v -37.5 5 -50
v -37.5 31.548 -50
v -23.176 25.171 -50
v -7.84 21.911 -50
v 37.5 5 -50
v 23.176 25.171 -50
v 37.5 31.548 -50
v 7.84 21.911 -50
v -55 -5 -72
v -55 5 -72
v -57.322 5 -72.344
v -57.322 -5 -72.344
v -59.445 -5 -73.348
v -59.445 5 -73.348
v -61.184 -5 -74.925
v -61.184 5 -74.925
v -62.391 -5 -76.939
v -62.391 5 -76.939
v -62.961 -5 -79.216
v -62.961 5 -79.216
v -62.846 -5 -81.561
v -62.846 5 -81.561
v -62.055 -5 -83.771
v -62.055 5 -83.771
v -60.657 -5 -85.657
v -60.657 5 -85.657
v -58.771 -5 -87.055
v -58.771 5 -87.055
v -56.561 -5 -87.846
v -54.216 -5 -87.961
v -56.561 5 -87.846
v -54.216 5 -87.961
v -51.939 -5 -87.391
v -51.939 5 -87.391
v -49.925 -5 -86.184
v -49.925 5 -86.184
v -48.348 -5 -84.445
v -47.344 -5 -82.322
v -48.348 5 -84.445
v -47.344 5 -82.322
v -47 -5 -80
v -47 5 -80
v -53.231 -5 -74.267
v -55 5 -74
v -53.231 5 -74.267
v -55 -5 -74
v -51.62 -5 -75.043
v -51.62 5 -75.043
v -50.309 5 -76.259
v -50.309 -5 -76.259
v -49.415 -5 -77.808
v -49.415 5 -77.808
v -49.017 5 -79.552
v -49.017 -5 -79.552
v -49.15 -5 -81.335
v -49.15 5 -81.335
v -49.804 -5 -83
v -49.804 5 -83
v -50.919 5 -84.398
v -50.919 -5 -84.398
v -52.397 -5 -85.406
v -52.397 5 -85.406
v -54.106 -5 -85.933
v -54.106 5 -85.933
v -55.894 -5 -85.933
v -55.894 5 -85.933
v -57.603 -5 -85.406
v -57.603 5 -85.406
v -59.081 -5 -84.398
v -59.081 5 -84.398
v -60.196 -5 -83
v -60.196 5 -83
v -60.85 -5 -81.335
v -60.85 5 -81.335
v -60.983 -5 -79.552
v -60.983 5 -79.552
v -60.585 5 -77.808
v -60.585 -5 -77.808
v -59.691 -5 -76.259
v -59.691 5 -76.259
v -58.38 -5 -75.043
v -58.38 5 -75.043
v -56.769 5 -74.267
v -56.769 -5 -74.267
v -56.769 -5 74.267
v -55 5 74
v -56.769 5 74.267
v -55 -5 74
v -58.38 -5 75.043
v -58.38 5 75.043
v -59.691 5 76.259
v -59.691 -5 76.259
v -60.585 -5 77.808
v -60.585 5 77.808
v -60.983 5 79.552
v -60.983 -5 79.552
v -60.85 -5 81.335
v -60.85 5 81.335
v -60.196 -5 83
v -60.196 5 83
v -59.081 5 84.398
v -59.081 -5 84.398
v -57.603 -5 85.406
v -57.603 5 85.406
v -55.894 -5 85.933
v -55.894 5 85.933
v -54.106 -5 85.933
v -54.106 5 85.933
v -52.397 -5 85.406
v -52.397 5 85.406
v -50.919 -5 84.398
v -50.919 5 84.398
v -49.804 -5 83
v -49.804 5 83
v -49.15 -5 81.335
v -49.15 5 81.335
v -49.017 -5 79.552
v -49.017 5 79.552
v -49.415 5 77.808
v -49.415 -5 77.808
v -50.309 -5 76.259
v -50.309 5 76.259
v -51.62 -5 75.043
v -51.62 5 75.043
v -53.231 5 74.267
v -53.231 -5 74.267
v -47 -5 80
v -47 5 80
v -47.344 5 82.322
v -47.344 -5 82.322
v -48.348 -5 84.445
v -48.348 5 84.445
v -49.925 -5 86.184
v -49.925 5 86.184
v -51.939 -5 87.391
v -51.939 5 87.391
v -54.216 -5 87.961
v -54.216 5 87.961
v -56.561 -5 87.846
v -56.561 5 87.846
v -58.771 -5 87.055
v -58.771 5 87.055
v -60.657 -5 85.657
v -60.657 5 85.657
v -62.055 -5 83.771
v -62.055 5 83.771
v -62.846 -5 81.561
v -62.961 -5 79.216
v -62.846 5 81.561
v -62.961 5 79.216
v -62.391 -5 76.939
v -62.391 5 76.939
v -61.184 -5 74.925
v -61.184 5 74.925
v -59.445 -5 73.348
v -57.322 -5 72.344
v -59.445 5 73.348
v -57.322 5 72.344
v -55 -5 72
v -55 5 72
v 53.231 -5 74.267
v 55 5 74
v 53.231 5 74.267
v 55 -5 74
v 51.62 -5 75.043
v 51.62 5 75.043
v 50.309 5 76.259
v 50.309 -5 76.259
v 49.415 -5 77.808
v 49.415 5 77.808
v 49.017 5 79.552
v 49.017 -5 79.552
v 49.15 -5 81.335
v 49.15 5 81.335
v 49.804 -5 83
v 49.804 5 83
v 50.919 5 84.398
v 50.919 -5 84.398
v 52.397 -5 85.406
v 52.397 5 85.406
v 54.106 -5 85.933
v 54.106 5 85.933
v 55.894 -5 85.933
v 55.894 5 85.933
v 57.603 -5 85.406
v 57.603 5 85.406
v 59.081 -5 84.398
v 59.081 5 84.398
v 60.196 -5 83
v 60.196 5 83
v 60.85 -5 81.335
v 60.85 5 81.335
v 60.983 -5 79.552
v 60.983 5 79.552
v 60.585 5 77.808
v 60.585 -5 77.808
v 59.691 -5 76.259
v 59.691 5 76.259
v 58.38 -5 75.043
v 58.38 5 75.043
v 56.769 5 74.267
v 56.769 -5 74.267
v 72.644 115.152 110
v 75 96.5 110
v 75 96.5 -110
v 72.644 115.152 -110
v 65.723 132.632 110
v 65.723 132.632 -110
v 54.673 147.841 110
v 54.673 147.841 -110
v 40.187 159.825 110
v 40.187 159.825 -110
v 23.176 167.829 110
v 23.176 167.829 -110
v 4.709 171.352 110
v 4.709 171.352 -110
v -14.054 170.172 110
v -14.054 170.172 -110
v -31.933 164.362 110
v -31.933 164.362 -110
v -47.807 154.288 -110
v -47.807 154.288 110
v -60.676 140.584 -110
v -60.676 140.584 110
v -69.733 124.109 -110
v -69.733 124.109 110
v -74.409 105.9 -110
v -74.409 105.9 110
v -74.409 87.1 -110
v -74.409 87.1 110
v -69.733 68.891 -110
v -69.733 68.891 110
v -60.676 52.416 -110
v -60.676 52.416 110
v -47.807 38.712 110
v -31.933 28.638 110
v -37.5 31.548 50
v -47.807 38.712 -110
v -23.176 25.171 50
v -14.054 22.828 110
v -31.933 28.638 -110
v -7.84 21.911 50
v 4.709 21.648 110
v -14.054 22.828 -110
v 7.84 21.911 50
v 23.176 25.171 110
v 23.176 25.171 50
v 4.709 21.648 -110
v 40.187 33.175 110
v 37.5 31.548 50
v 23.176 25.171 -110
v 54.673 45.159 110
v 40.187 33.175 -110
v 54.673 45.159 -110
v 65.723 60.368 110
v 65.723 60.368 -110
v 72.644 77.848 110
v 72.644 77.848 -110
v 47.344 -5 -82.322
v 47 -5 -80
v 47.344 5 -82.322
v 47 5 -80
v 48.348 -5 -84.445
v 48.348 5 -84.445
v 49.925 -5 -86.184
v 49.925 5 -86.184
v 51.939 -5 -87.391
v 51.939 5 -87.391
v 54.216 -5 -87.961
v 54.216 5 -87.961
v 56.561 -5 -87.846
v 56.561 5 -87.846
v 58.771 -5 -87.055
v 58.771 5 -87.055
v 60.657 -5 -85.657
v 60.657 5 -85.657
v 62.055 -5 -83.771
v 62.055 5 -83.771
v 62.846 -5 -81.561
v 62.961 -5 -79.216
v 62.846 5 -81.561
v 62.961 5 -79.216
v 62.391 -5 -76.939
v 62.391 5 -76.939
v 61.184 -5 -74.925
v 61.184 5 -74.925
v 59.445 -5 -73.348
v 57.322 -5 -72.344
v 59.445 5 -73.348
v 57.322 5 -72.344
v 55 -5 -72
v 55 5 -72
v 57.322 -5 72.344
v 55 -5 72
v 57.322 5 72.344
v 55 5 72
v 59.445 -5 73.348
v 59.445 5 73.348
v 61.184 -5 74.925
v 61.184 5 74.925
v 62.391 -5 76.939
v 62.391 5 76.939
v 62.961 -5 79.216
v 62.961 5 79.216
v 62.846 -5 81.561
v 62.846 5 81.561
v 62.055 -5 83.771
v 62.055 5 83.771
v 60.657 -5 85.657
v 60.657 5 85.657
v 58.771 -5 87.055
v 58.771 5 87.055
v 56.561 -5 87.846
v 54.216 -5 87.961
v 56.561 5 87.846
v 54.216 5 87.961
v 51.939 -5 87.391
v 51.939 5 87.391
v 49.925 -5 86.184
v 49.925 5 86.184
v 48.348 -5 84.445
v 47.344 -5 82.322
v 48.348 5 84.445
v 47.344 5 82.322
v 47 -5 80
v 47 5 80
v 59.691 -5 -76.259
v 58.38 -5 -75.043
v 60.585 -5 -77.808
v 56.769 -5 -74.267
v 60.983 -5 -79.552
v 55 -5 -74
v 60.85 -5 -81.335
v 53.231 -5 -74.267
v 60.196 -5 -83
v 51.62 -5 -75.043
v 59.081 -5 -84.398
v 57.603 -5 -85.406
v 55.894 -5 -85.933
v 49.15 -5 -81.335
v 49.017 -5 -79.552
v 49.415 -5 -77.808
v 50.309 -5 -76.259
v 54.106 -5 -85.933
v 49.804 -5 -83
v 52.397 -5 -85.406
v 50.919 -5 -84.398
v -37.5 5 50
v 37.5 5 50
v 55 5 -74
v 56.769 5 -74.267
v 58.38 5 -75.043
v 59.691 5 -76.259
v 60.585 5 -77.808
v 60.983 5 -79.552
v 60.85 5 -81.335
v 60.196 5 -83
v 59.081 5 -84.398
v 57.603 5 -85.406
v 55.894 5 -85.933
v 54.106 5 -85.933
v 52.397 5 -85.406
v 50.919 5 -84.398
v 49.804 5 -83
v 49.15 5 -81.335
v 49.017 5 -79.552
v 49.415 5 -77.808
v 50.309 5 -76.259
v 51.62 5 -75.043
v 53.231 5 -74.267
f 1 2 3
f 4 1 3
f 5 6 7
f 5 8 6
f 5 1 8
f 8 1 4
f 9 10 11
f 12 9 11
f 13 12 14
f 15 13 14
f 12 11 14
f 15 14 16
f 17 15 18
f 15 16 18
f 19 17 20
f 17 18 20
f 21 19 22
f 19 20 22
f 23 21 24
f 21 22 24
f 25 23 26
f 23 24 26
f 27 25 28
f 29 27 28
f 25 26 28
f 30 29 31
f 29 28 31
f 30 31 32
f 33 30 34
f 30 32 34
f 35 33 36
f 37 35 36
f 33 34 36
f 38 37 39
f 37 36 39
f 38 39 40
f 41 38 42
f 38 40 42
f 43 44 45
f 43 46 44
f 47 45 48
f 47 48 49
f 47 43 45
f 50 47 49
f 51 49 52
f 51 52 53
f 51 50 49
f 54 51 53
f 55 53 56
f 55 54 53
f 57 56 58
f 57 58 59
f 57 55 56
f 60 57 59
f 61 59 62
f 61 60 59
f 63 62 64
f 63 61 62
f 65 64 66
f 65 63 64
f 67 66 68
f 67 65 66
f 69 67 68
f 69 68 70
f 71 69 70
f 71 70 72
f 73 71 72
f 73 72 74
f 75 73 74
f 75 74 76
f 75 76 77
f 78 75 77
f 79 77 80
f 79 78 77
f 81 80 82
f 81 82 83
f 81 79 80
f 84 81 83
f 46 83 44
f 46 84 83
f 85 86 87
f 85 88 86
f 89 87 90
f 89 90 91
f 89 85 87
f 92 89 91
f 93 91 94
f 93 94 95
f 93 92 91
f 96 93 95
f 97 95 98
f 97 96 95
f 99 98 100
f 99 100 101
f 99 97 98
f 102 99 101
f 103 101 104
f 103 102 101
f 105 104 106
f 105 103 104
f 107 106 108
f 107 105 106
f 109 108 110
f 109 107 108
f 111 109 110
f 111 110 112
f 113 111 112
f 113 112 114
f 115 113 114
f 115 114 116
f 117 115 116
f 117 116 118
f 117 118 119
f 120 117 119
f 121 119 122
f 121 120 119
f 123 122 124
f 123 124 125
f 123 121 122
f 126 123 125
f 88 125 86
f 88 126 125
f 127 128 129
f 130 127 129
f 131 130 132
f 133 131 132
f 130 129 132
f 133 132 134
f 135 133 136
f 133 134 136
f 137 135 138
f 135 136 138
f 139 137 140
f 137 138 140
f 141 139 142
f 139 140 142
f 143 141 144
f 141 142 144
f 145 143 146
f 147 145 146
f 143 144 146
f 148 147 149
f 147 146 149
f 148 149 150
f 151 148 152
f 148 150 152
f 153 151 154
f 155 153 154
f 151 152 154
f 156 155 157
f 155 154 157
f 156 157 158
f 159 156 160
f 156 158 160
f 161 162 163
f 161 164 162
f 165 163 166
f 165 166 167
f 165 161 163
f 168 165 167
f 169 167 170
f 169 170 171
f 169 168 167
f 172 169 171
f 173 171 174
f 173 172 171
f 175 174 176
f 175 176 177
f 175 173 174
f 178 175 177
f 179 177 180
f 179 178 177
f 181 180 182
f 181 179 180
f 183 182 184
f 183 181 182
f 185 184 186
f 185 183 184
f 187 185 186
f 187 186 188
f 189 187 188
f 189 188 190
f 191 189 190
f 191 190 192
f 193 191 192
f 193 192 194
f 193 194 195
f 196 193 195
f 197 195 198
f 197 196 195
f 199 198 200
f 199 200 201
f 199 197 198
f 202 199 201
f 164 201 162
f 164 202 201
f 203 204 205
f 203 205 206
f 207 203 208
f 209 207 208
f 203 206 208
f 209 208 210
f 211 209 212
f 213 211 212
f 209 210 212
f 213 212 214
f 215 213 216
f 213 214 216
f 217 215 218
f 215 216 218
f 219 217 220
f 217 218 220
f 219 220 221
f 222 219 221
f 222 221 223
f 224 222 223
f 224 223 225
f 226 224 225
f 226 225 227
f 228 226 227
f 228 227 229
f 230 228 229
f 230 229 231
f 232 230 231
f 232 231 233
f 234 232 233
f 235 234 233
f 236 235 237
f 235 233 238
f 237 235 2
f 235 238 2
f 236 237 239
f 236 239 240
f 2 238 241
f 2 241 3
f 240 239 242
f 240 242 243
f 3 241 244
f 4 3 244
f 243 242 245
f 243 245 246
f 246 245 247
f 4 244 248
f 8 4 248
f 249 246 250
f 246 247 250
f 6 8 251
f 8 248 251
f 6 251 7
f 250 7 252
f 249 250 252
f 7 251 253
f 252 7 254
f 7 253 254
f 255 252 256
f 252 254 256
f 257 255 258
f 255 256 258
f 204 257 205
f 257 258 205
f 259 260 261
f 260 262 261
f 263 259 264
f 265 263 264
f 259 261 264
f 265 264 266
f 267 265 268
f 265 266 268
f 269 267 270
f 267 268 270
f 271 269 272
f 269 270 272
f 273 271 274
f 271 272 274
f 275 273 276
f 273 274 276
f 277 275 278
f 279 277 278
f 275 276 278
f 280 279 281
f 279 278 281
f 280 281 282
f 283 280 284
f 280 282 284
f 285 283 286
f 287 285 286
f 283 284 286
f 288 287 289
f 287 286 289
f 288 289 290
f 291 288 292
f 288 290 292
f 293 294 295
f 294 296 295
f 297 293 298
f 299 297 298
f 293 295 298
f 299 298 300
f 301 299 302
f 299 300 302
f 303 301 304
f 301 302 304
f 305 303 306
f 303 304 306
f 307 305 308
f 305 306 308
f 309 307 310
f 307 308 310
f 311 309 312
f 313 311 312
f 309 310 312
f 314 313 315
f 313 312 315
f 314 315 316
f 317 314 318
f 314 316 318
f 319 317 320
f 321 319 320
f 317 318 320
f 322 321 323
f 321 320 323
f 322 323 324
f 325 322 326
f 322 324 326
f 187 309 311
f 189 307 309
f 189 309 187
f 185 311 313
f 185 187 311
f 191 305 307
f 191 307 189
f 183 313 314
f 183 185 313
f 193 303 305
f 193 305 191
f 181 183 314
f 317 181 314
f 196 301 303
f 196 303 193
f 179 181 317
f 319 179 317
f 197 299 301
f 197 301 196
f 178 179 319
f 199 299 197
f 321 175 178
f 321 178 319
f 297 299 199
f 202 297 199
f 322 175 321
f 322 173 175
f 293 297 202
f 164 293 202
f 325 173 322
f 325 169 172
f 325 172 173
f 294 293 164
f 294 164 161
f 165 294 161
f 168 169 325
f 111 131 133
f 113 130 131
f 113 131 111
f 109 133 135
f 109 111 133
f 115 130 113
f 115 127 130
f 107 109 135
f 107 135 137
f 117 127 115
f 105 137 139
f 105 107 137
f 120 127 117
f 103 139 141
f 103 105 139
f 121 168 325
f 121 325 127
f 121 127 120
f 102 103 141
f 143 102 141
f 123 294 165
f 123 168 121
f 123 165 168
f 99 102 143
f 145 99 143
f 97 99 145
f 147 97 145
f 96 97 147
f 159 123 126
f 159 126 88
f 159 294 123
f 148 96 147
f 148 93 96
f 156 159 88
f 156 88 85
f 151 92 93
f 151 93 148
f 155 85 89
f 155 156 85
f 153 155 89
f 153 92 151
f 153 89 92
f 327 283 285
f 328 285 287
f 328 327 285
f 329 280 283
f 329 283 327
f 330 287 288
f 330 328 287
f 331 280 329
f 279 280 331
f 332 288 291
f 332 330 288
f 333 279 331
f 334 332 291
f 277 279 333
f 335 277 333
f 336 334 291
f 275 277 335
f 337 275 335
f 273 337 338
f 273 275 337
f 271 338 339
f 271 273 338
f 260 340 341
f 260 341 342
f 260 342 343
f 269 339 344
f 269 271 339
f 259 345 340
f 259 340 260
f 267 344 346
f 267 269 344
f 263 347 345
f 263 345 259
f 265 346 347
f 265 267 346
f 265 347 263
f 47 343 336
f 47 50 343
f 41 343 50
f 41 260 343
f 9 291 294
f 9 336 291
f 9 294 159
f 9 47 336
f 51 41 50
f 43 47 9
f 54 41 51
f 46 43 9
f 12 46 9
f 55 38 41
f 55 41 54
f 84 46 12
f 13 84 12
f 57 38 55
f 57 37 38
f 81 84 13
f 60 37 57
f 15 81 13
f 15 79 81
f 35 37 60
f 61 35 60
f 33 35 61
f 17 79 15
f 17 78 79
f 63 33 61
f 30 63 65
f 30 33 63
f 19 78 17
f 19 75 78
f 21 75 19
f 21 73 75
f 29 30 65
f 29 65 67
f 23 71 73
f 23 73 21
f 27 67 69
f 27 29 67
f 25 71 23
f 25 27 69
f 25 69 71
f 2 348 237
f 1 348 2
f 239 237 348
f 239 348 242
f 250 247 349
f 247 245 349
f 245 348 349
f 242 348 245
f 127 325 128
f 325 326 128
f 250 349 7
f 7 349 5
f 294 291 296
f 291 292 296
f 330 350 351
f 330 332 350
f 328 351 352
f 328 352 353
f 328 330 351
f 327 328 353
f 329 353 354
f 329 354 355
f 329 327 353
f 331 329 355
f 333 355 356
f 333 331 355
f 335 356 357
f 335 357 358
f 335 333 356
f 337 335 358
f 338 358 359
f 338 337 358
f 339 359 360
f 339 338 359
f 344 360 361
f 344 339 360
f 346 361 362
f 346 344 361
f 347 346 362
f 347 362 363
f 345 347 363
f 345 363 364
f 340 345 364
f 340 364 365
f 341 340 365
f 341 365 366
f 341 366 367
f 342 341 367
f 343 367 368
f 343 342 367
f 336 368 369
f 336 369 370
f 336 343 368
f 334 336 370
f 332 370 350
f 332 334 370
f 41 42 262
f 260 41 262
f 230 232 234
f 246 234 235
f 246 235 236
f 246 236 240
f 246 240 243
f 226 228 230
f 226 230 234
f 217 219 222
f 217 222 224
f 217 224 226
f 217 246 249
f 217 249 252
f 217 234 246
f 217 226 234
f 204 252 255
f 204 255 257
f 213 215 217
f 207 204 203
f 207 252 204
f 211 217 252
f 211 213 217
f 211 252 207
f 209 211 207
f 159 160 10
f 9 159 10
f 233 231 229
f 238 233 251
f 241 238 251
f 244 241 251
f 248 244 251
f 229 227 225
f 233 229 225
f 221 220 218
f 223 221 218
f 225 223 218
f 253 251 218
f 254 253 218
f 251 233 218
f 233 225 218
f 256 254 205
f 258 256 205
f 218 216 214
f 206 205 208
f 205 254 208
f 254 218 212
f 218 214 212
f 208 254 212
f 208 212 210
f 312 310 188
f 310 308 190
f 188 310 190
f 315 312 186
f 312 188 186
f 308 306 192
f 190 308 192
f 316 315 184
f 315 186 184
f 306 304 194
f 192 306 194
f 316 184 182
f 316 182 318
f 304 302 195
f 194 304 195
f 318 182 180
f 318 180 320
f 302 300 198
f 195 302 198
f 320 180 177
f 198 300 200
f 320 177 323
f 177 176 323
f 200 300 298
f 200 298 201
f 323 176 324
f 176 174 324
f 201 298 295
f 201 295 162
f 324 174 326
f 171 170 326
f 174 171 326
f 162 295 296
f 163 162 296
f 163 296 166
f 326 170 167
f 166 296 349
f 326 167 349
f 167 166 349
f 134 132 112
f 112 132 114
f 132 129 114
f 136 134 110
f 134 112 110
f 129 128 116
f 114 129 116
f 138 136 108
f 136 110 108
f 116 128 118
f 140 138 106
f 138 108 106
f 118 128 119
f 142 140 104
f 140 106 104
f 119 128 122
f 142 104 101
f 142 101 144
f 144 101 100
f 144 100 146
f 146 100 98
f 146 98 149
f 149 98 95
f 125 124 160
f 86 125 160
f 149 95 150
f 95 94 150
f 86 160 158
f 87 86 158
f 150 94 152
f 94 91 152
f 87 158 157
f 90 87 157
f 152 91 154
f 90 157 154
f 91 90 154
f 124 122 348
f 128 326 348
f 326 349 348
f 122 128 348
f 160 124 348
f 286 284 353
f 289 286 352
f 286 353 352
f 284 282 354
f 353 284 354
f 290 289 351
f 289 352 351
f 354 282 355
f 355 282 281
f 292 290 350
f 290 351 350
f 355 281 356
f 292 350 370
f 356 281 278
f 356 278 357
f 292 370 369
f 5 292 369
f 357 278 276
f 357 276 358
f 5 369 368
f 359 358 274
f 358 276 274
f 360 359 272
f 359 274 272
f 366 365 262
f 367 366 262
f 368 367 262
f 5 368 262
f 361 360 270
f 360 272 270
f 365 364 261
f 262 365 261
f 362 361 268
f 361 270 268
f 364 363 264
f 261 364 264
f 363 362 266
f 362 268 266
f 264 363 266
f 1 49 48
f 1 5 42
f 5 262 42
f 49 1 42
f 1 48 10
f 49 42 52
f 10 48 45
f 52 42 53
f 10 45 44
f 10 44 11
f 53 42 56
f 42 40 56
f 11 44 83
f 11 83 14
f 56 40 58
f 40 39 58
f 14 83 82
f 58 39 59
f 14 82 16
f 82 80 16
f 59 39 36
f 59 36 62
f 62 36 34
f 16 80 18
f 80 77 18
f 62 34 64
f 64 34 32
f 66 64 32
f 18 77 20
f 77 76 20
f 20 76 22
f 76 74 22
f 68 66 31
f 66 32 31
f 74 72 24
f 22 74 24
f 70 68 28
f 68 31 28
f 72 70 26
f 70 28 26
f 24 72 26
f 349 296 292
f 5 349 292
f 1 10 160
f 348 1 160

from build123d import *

# Parameters (mm, degrees)
SKETCH1_R                = 6
BOSS_EXTRUDE1_DEPTH      = 5
SKETCH2_W                = 75
SKETCH2_H                = 100
BOSS_EXTRUDE2_DEPTH      = 30
BOSS_EXTRUDE3_DEPTH      = 60
BOSS_EXTRUDE3_DEPTH_BACK = 160
SKETCH3_R                = 75


with BuildPart() as part:
    # Sketch1 → Boss-Extrude1 (new, symmetric)
    with BuildSketch(Plane(origin=(0, 0, 0), x_dir=(1, 0, 0), z_dir=(0, 1, 0))):
        with BuildLine():
            Line((-47, 80), (47, 80))
            ThreePointArc((47, 80), (60.656854249, 85.656854249), (55, 72))
            Line((55, 72), (55, -72))
            ThreePointArc((55, -72), (60.656854249, -85.656854249), (47, -80))
            Line((47, -80), (-47, -80))
            ThreePointArc((-47, -80), (-60.656854249, -85.656854249), (-55, -72))
            Line((-55, -72), (-55, 72))
            ThreePointArc((-55, 72), (-60.656854249, 85.656854249), (-47, 80))
        make_face()
        with Locations(Location((55, 80, 0), (0, 0, 270))):
            Circle(SKETCH1_R, mode=Mode.SUBTRACT)
        with Locations(Location((-55, 80, 0), (0, 0, 270))):
            Circle(SKETCH1_R, mode=Mode.SUBTRACT)
        with Locations(Location((55, -80, 0), (0, 0, 90))):
            Circle(SKETCH1_R, mode=Mode.SUBTRACT)
        with Locations(Location((-55, -80, 0), (0, 0, 90))):
            Circle(SKETCH1_R, mode=Mode.SUBTRACT)
    extrude(amount=BOSS_EXTRUDE1_DEPTH, both=True)

    # Sketch2 → Boss-Extrude2 (add)
    with BuildSketch(Plane(origin=(0, 5, 0), x_dir=(1, 0, 0), z_dir=(0, 1, 0))):
        Rectangle(SKETCH2_W, SKETCH2_H)
    extrude(amount=BOSS_EXTRUDE2_DEPTH)

    # Sketch3 → Boss-Extrude3 (add, two sides: drawn at the far end of the back side and taken through both)
    with BuildSketch(Plane.XY.offset(50).offset(-BOSS_EXTRUDE3_DEPTH_BACK)):
        with Locations((0, 96.5)):
            Circle(SKETCH3_R)
    extrude(amount=BOSS_EXTRUDE3_DEPTH + BOSS_EXTRUDE3_DEPTH_BACK)


solid = part.part
